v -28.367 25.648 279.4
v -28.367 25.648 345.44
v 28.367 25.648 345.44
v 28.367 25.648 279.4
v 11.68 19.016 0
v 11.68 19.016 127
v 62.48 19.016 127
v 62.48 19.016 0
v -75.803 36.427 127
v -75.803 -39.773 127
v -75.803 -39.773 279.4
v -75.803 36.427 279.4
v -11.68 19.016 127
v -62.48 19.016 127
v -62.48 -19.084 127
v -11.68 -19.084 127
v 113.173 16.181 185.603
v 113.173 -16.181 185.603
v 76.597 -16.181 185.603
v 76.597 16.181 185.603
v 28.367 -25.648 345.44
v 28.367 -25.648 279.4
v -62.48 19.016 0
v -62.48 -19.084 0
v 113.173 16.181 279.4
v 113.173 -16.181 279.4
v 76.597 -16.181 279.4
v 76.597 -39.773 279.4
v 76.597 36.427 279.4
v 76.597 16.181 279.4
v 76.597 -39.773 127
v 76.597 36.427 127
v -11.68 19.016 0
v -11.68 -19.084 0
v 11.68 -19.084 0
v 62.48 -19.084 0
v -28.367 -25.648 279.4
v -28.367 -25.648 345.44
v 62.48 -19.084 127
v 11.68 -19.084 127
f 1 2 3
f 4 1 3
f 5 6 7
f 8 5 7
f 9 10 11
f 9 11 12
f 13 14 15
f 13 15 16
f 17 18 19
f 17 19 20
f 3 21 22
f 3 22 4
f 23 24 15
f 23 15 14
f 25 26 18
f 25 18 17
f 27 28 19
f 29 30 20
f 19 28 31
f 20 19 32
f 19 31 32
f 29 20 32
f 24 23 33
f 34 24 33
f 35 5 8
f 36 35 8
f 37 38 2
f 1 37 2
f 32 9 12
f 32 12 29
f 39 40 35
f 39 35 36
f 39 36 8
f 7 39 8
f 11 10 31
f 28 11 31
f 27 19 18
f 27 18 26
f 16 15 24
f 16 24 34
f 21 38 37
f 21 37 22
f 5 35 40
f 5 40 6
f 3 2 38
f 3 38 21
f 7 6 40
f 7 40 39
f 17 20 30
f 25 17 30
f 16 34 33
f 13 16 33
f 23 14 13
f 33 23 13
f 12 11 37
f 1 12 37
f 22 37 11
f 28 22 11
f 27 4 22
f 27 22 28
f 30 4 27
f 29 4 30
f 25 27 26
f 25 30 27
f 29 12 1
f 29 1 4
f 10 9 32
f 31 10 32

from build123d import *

# Parameters (mm, degrees)
F0_W     = 50.8
F0_H     = 38.1
F1_DEPTH = 127
F2_W     = 152.4
F2_H     = 76.2
F2_W_2   = 50.8
F2_H_2   = 38.1
F3_DEPTH = 152.4
F4_W     = 56.7341633141
F4_H     = 51.2951239944
F5_DEPTH = 66.04
F6_W     = 32.3613445262
F6_H     = 93.7973558903
F7_DEPTH = 36.576


with BuildPart() as f1:
    # F0 (on Top) → F1 (new body)
    with BuildSketch(Plane.XY):
        with Locations((-37.0803937972, -0.0342295945)):
            Rectangle(F0_W, F0_H)
    extrude(amount=F1_DEPTH)


with BuildPart() as f1b:
    # F0 (on Top) → F1, piece 2 (new body)
    with BuildSketch(Plane.XY):
        with Locations((37.0803937972, -0.0342295945)):
            Rectangle(F0_W, F0_H)
    extrude(amount=F1_DEPTH)


with BuildPart() as f3:
    # F2 (on face) → F3 (new body)
    with BuildSketch(Plane.XY.offset(127)):
        with Locations((0.3965346944, -1.672820802)):
            Rectangle(F2_W, F2_H)
        with Locations((-37.0803937972, -0.0342295945)):
            Rectangle(F2_W_2, F2_H_2, mode=Mode.SUBTRACT)
        with Locations((-37.0803937972, -0.0342295945)):
            Rectangle(F2_W_2, F2_H_2)
    extrude(amount=F3_DEPTH)

    # F4 (on face) → F5 (join)
    with BuildSketch(Plane.XY.offset(279.4)):
        Rectangle(F4_W, F4_H)
    extrude(amount=F5_DEPTH)

    # F6 (on face) → F7 (join)
    with BuildSketch(Plane.YZ.offset(76.5965346944)):
        with Locations((0, 232.5013220549)):
            Rectangle(F6_W, F6_H)
    extrude(amount=F7_DEPTH)


solid = Compound([f1.part, f1b.part, f3.part])
